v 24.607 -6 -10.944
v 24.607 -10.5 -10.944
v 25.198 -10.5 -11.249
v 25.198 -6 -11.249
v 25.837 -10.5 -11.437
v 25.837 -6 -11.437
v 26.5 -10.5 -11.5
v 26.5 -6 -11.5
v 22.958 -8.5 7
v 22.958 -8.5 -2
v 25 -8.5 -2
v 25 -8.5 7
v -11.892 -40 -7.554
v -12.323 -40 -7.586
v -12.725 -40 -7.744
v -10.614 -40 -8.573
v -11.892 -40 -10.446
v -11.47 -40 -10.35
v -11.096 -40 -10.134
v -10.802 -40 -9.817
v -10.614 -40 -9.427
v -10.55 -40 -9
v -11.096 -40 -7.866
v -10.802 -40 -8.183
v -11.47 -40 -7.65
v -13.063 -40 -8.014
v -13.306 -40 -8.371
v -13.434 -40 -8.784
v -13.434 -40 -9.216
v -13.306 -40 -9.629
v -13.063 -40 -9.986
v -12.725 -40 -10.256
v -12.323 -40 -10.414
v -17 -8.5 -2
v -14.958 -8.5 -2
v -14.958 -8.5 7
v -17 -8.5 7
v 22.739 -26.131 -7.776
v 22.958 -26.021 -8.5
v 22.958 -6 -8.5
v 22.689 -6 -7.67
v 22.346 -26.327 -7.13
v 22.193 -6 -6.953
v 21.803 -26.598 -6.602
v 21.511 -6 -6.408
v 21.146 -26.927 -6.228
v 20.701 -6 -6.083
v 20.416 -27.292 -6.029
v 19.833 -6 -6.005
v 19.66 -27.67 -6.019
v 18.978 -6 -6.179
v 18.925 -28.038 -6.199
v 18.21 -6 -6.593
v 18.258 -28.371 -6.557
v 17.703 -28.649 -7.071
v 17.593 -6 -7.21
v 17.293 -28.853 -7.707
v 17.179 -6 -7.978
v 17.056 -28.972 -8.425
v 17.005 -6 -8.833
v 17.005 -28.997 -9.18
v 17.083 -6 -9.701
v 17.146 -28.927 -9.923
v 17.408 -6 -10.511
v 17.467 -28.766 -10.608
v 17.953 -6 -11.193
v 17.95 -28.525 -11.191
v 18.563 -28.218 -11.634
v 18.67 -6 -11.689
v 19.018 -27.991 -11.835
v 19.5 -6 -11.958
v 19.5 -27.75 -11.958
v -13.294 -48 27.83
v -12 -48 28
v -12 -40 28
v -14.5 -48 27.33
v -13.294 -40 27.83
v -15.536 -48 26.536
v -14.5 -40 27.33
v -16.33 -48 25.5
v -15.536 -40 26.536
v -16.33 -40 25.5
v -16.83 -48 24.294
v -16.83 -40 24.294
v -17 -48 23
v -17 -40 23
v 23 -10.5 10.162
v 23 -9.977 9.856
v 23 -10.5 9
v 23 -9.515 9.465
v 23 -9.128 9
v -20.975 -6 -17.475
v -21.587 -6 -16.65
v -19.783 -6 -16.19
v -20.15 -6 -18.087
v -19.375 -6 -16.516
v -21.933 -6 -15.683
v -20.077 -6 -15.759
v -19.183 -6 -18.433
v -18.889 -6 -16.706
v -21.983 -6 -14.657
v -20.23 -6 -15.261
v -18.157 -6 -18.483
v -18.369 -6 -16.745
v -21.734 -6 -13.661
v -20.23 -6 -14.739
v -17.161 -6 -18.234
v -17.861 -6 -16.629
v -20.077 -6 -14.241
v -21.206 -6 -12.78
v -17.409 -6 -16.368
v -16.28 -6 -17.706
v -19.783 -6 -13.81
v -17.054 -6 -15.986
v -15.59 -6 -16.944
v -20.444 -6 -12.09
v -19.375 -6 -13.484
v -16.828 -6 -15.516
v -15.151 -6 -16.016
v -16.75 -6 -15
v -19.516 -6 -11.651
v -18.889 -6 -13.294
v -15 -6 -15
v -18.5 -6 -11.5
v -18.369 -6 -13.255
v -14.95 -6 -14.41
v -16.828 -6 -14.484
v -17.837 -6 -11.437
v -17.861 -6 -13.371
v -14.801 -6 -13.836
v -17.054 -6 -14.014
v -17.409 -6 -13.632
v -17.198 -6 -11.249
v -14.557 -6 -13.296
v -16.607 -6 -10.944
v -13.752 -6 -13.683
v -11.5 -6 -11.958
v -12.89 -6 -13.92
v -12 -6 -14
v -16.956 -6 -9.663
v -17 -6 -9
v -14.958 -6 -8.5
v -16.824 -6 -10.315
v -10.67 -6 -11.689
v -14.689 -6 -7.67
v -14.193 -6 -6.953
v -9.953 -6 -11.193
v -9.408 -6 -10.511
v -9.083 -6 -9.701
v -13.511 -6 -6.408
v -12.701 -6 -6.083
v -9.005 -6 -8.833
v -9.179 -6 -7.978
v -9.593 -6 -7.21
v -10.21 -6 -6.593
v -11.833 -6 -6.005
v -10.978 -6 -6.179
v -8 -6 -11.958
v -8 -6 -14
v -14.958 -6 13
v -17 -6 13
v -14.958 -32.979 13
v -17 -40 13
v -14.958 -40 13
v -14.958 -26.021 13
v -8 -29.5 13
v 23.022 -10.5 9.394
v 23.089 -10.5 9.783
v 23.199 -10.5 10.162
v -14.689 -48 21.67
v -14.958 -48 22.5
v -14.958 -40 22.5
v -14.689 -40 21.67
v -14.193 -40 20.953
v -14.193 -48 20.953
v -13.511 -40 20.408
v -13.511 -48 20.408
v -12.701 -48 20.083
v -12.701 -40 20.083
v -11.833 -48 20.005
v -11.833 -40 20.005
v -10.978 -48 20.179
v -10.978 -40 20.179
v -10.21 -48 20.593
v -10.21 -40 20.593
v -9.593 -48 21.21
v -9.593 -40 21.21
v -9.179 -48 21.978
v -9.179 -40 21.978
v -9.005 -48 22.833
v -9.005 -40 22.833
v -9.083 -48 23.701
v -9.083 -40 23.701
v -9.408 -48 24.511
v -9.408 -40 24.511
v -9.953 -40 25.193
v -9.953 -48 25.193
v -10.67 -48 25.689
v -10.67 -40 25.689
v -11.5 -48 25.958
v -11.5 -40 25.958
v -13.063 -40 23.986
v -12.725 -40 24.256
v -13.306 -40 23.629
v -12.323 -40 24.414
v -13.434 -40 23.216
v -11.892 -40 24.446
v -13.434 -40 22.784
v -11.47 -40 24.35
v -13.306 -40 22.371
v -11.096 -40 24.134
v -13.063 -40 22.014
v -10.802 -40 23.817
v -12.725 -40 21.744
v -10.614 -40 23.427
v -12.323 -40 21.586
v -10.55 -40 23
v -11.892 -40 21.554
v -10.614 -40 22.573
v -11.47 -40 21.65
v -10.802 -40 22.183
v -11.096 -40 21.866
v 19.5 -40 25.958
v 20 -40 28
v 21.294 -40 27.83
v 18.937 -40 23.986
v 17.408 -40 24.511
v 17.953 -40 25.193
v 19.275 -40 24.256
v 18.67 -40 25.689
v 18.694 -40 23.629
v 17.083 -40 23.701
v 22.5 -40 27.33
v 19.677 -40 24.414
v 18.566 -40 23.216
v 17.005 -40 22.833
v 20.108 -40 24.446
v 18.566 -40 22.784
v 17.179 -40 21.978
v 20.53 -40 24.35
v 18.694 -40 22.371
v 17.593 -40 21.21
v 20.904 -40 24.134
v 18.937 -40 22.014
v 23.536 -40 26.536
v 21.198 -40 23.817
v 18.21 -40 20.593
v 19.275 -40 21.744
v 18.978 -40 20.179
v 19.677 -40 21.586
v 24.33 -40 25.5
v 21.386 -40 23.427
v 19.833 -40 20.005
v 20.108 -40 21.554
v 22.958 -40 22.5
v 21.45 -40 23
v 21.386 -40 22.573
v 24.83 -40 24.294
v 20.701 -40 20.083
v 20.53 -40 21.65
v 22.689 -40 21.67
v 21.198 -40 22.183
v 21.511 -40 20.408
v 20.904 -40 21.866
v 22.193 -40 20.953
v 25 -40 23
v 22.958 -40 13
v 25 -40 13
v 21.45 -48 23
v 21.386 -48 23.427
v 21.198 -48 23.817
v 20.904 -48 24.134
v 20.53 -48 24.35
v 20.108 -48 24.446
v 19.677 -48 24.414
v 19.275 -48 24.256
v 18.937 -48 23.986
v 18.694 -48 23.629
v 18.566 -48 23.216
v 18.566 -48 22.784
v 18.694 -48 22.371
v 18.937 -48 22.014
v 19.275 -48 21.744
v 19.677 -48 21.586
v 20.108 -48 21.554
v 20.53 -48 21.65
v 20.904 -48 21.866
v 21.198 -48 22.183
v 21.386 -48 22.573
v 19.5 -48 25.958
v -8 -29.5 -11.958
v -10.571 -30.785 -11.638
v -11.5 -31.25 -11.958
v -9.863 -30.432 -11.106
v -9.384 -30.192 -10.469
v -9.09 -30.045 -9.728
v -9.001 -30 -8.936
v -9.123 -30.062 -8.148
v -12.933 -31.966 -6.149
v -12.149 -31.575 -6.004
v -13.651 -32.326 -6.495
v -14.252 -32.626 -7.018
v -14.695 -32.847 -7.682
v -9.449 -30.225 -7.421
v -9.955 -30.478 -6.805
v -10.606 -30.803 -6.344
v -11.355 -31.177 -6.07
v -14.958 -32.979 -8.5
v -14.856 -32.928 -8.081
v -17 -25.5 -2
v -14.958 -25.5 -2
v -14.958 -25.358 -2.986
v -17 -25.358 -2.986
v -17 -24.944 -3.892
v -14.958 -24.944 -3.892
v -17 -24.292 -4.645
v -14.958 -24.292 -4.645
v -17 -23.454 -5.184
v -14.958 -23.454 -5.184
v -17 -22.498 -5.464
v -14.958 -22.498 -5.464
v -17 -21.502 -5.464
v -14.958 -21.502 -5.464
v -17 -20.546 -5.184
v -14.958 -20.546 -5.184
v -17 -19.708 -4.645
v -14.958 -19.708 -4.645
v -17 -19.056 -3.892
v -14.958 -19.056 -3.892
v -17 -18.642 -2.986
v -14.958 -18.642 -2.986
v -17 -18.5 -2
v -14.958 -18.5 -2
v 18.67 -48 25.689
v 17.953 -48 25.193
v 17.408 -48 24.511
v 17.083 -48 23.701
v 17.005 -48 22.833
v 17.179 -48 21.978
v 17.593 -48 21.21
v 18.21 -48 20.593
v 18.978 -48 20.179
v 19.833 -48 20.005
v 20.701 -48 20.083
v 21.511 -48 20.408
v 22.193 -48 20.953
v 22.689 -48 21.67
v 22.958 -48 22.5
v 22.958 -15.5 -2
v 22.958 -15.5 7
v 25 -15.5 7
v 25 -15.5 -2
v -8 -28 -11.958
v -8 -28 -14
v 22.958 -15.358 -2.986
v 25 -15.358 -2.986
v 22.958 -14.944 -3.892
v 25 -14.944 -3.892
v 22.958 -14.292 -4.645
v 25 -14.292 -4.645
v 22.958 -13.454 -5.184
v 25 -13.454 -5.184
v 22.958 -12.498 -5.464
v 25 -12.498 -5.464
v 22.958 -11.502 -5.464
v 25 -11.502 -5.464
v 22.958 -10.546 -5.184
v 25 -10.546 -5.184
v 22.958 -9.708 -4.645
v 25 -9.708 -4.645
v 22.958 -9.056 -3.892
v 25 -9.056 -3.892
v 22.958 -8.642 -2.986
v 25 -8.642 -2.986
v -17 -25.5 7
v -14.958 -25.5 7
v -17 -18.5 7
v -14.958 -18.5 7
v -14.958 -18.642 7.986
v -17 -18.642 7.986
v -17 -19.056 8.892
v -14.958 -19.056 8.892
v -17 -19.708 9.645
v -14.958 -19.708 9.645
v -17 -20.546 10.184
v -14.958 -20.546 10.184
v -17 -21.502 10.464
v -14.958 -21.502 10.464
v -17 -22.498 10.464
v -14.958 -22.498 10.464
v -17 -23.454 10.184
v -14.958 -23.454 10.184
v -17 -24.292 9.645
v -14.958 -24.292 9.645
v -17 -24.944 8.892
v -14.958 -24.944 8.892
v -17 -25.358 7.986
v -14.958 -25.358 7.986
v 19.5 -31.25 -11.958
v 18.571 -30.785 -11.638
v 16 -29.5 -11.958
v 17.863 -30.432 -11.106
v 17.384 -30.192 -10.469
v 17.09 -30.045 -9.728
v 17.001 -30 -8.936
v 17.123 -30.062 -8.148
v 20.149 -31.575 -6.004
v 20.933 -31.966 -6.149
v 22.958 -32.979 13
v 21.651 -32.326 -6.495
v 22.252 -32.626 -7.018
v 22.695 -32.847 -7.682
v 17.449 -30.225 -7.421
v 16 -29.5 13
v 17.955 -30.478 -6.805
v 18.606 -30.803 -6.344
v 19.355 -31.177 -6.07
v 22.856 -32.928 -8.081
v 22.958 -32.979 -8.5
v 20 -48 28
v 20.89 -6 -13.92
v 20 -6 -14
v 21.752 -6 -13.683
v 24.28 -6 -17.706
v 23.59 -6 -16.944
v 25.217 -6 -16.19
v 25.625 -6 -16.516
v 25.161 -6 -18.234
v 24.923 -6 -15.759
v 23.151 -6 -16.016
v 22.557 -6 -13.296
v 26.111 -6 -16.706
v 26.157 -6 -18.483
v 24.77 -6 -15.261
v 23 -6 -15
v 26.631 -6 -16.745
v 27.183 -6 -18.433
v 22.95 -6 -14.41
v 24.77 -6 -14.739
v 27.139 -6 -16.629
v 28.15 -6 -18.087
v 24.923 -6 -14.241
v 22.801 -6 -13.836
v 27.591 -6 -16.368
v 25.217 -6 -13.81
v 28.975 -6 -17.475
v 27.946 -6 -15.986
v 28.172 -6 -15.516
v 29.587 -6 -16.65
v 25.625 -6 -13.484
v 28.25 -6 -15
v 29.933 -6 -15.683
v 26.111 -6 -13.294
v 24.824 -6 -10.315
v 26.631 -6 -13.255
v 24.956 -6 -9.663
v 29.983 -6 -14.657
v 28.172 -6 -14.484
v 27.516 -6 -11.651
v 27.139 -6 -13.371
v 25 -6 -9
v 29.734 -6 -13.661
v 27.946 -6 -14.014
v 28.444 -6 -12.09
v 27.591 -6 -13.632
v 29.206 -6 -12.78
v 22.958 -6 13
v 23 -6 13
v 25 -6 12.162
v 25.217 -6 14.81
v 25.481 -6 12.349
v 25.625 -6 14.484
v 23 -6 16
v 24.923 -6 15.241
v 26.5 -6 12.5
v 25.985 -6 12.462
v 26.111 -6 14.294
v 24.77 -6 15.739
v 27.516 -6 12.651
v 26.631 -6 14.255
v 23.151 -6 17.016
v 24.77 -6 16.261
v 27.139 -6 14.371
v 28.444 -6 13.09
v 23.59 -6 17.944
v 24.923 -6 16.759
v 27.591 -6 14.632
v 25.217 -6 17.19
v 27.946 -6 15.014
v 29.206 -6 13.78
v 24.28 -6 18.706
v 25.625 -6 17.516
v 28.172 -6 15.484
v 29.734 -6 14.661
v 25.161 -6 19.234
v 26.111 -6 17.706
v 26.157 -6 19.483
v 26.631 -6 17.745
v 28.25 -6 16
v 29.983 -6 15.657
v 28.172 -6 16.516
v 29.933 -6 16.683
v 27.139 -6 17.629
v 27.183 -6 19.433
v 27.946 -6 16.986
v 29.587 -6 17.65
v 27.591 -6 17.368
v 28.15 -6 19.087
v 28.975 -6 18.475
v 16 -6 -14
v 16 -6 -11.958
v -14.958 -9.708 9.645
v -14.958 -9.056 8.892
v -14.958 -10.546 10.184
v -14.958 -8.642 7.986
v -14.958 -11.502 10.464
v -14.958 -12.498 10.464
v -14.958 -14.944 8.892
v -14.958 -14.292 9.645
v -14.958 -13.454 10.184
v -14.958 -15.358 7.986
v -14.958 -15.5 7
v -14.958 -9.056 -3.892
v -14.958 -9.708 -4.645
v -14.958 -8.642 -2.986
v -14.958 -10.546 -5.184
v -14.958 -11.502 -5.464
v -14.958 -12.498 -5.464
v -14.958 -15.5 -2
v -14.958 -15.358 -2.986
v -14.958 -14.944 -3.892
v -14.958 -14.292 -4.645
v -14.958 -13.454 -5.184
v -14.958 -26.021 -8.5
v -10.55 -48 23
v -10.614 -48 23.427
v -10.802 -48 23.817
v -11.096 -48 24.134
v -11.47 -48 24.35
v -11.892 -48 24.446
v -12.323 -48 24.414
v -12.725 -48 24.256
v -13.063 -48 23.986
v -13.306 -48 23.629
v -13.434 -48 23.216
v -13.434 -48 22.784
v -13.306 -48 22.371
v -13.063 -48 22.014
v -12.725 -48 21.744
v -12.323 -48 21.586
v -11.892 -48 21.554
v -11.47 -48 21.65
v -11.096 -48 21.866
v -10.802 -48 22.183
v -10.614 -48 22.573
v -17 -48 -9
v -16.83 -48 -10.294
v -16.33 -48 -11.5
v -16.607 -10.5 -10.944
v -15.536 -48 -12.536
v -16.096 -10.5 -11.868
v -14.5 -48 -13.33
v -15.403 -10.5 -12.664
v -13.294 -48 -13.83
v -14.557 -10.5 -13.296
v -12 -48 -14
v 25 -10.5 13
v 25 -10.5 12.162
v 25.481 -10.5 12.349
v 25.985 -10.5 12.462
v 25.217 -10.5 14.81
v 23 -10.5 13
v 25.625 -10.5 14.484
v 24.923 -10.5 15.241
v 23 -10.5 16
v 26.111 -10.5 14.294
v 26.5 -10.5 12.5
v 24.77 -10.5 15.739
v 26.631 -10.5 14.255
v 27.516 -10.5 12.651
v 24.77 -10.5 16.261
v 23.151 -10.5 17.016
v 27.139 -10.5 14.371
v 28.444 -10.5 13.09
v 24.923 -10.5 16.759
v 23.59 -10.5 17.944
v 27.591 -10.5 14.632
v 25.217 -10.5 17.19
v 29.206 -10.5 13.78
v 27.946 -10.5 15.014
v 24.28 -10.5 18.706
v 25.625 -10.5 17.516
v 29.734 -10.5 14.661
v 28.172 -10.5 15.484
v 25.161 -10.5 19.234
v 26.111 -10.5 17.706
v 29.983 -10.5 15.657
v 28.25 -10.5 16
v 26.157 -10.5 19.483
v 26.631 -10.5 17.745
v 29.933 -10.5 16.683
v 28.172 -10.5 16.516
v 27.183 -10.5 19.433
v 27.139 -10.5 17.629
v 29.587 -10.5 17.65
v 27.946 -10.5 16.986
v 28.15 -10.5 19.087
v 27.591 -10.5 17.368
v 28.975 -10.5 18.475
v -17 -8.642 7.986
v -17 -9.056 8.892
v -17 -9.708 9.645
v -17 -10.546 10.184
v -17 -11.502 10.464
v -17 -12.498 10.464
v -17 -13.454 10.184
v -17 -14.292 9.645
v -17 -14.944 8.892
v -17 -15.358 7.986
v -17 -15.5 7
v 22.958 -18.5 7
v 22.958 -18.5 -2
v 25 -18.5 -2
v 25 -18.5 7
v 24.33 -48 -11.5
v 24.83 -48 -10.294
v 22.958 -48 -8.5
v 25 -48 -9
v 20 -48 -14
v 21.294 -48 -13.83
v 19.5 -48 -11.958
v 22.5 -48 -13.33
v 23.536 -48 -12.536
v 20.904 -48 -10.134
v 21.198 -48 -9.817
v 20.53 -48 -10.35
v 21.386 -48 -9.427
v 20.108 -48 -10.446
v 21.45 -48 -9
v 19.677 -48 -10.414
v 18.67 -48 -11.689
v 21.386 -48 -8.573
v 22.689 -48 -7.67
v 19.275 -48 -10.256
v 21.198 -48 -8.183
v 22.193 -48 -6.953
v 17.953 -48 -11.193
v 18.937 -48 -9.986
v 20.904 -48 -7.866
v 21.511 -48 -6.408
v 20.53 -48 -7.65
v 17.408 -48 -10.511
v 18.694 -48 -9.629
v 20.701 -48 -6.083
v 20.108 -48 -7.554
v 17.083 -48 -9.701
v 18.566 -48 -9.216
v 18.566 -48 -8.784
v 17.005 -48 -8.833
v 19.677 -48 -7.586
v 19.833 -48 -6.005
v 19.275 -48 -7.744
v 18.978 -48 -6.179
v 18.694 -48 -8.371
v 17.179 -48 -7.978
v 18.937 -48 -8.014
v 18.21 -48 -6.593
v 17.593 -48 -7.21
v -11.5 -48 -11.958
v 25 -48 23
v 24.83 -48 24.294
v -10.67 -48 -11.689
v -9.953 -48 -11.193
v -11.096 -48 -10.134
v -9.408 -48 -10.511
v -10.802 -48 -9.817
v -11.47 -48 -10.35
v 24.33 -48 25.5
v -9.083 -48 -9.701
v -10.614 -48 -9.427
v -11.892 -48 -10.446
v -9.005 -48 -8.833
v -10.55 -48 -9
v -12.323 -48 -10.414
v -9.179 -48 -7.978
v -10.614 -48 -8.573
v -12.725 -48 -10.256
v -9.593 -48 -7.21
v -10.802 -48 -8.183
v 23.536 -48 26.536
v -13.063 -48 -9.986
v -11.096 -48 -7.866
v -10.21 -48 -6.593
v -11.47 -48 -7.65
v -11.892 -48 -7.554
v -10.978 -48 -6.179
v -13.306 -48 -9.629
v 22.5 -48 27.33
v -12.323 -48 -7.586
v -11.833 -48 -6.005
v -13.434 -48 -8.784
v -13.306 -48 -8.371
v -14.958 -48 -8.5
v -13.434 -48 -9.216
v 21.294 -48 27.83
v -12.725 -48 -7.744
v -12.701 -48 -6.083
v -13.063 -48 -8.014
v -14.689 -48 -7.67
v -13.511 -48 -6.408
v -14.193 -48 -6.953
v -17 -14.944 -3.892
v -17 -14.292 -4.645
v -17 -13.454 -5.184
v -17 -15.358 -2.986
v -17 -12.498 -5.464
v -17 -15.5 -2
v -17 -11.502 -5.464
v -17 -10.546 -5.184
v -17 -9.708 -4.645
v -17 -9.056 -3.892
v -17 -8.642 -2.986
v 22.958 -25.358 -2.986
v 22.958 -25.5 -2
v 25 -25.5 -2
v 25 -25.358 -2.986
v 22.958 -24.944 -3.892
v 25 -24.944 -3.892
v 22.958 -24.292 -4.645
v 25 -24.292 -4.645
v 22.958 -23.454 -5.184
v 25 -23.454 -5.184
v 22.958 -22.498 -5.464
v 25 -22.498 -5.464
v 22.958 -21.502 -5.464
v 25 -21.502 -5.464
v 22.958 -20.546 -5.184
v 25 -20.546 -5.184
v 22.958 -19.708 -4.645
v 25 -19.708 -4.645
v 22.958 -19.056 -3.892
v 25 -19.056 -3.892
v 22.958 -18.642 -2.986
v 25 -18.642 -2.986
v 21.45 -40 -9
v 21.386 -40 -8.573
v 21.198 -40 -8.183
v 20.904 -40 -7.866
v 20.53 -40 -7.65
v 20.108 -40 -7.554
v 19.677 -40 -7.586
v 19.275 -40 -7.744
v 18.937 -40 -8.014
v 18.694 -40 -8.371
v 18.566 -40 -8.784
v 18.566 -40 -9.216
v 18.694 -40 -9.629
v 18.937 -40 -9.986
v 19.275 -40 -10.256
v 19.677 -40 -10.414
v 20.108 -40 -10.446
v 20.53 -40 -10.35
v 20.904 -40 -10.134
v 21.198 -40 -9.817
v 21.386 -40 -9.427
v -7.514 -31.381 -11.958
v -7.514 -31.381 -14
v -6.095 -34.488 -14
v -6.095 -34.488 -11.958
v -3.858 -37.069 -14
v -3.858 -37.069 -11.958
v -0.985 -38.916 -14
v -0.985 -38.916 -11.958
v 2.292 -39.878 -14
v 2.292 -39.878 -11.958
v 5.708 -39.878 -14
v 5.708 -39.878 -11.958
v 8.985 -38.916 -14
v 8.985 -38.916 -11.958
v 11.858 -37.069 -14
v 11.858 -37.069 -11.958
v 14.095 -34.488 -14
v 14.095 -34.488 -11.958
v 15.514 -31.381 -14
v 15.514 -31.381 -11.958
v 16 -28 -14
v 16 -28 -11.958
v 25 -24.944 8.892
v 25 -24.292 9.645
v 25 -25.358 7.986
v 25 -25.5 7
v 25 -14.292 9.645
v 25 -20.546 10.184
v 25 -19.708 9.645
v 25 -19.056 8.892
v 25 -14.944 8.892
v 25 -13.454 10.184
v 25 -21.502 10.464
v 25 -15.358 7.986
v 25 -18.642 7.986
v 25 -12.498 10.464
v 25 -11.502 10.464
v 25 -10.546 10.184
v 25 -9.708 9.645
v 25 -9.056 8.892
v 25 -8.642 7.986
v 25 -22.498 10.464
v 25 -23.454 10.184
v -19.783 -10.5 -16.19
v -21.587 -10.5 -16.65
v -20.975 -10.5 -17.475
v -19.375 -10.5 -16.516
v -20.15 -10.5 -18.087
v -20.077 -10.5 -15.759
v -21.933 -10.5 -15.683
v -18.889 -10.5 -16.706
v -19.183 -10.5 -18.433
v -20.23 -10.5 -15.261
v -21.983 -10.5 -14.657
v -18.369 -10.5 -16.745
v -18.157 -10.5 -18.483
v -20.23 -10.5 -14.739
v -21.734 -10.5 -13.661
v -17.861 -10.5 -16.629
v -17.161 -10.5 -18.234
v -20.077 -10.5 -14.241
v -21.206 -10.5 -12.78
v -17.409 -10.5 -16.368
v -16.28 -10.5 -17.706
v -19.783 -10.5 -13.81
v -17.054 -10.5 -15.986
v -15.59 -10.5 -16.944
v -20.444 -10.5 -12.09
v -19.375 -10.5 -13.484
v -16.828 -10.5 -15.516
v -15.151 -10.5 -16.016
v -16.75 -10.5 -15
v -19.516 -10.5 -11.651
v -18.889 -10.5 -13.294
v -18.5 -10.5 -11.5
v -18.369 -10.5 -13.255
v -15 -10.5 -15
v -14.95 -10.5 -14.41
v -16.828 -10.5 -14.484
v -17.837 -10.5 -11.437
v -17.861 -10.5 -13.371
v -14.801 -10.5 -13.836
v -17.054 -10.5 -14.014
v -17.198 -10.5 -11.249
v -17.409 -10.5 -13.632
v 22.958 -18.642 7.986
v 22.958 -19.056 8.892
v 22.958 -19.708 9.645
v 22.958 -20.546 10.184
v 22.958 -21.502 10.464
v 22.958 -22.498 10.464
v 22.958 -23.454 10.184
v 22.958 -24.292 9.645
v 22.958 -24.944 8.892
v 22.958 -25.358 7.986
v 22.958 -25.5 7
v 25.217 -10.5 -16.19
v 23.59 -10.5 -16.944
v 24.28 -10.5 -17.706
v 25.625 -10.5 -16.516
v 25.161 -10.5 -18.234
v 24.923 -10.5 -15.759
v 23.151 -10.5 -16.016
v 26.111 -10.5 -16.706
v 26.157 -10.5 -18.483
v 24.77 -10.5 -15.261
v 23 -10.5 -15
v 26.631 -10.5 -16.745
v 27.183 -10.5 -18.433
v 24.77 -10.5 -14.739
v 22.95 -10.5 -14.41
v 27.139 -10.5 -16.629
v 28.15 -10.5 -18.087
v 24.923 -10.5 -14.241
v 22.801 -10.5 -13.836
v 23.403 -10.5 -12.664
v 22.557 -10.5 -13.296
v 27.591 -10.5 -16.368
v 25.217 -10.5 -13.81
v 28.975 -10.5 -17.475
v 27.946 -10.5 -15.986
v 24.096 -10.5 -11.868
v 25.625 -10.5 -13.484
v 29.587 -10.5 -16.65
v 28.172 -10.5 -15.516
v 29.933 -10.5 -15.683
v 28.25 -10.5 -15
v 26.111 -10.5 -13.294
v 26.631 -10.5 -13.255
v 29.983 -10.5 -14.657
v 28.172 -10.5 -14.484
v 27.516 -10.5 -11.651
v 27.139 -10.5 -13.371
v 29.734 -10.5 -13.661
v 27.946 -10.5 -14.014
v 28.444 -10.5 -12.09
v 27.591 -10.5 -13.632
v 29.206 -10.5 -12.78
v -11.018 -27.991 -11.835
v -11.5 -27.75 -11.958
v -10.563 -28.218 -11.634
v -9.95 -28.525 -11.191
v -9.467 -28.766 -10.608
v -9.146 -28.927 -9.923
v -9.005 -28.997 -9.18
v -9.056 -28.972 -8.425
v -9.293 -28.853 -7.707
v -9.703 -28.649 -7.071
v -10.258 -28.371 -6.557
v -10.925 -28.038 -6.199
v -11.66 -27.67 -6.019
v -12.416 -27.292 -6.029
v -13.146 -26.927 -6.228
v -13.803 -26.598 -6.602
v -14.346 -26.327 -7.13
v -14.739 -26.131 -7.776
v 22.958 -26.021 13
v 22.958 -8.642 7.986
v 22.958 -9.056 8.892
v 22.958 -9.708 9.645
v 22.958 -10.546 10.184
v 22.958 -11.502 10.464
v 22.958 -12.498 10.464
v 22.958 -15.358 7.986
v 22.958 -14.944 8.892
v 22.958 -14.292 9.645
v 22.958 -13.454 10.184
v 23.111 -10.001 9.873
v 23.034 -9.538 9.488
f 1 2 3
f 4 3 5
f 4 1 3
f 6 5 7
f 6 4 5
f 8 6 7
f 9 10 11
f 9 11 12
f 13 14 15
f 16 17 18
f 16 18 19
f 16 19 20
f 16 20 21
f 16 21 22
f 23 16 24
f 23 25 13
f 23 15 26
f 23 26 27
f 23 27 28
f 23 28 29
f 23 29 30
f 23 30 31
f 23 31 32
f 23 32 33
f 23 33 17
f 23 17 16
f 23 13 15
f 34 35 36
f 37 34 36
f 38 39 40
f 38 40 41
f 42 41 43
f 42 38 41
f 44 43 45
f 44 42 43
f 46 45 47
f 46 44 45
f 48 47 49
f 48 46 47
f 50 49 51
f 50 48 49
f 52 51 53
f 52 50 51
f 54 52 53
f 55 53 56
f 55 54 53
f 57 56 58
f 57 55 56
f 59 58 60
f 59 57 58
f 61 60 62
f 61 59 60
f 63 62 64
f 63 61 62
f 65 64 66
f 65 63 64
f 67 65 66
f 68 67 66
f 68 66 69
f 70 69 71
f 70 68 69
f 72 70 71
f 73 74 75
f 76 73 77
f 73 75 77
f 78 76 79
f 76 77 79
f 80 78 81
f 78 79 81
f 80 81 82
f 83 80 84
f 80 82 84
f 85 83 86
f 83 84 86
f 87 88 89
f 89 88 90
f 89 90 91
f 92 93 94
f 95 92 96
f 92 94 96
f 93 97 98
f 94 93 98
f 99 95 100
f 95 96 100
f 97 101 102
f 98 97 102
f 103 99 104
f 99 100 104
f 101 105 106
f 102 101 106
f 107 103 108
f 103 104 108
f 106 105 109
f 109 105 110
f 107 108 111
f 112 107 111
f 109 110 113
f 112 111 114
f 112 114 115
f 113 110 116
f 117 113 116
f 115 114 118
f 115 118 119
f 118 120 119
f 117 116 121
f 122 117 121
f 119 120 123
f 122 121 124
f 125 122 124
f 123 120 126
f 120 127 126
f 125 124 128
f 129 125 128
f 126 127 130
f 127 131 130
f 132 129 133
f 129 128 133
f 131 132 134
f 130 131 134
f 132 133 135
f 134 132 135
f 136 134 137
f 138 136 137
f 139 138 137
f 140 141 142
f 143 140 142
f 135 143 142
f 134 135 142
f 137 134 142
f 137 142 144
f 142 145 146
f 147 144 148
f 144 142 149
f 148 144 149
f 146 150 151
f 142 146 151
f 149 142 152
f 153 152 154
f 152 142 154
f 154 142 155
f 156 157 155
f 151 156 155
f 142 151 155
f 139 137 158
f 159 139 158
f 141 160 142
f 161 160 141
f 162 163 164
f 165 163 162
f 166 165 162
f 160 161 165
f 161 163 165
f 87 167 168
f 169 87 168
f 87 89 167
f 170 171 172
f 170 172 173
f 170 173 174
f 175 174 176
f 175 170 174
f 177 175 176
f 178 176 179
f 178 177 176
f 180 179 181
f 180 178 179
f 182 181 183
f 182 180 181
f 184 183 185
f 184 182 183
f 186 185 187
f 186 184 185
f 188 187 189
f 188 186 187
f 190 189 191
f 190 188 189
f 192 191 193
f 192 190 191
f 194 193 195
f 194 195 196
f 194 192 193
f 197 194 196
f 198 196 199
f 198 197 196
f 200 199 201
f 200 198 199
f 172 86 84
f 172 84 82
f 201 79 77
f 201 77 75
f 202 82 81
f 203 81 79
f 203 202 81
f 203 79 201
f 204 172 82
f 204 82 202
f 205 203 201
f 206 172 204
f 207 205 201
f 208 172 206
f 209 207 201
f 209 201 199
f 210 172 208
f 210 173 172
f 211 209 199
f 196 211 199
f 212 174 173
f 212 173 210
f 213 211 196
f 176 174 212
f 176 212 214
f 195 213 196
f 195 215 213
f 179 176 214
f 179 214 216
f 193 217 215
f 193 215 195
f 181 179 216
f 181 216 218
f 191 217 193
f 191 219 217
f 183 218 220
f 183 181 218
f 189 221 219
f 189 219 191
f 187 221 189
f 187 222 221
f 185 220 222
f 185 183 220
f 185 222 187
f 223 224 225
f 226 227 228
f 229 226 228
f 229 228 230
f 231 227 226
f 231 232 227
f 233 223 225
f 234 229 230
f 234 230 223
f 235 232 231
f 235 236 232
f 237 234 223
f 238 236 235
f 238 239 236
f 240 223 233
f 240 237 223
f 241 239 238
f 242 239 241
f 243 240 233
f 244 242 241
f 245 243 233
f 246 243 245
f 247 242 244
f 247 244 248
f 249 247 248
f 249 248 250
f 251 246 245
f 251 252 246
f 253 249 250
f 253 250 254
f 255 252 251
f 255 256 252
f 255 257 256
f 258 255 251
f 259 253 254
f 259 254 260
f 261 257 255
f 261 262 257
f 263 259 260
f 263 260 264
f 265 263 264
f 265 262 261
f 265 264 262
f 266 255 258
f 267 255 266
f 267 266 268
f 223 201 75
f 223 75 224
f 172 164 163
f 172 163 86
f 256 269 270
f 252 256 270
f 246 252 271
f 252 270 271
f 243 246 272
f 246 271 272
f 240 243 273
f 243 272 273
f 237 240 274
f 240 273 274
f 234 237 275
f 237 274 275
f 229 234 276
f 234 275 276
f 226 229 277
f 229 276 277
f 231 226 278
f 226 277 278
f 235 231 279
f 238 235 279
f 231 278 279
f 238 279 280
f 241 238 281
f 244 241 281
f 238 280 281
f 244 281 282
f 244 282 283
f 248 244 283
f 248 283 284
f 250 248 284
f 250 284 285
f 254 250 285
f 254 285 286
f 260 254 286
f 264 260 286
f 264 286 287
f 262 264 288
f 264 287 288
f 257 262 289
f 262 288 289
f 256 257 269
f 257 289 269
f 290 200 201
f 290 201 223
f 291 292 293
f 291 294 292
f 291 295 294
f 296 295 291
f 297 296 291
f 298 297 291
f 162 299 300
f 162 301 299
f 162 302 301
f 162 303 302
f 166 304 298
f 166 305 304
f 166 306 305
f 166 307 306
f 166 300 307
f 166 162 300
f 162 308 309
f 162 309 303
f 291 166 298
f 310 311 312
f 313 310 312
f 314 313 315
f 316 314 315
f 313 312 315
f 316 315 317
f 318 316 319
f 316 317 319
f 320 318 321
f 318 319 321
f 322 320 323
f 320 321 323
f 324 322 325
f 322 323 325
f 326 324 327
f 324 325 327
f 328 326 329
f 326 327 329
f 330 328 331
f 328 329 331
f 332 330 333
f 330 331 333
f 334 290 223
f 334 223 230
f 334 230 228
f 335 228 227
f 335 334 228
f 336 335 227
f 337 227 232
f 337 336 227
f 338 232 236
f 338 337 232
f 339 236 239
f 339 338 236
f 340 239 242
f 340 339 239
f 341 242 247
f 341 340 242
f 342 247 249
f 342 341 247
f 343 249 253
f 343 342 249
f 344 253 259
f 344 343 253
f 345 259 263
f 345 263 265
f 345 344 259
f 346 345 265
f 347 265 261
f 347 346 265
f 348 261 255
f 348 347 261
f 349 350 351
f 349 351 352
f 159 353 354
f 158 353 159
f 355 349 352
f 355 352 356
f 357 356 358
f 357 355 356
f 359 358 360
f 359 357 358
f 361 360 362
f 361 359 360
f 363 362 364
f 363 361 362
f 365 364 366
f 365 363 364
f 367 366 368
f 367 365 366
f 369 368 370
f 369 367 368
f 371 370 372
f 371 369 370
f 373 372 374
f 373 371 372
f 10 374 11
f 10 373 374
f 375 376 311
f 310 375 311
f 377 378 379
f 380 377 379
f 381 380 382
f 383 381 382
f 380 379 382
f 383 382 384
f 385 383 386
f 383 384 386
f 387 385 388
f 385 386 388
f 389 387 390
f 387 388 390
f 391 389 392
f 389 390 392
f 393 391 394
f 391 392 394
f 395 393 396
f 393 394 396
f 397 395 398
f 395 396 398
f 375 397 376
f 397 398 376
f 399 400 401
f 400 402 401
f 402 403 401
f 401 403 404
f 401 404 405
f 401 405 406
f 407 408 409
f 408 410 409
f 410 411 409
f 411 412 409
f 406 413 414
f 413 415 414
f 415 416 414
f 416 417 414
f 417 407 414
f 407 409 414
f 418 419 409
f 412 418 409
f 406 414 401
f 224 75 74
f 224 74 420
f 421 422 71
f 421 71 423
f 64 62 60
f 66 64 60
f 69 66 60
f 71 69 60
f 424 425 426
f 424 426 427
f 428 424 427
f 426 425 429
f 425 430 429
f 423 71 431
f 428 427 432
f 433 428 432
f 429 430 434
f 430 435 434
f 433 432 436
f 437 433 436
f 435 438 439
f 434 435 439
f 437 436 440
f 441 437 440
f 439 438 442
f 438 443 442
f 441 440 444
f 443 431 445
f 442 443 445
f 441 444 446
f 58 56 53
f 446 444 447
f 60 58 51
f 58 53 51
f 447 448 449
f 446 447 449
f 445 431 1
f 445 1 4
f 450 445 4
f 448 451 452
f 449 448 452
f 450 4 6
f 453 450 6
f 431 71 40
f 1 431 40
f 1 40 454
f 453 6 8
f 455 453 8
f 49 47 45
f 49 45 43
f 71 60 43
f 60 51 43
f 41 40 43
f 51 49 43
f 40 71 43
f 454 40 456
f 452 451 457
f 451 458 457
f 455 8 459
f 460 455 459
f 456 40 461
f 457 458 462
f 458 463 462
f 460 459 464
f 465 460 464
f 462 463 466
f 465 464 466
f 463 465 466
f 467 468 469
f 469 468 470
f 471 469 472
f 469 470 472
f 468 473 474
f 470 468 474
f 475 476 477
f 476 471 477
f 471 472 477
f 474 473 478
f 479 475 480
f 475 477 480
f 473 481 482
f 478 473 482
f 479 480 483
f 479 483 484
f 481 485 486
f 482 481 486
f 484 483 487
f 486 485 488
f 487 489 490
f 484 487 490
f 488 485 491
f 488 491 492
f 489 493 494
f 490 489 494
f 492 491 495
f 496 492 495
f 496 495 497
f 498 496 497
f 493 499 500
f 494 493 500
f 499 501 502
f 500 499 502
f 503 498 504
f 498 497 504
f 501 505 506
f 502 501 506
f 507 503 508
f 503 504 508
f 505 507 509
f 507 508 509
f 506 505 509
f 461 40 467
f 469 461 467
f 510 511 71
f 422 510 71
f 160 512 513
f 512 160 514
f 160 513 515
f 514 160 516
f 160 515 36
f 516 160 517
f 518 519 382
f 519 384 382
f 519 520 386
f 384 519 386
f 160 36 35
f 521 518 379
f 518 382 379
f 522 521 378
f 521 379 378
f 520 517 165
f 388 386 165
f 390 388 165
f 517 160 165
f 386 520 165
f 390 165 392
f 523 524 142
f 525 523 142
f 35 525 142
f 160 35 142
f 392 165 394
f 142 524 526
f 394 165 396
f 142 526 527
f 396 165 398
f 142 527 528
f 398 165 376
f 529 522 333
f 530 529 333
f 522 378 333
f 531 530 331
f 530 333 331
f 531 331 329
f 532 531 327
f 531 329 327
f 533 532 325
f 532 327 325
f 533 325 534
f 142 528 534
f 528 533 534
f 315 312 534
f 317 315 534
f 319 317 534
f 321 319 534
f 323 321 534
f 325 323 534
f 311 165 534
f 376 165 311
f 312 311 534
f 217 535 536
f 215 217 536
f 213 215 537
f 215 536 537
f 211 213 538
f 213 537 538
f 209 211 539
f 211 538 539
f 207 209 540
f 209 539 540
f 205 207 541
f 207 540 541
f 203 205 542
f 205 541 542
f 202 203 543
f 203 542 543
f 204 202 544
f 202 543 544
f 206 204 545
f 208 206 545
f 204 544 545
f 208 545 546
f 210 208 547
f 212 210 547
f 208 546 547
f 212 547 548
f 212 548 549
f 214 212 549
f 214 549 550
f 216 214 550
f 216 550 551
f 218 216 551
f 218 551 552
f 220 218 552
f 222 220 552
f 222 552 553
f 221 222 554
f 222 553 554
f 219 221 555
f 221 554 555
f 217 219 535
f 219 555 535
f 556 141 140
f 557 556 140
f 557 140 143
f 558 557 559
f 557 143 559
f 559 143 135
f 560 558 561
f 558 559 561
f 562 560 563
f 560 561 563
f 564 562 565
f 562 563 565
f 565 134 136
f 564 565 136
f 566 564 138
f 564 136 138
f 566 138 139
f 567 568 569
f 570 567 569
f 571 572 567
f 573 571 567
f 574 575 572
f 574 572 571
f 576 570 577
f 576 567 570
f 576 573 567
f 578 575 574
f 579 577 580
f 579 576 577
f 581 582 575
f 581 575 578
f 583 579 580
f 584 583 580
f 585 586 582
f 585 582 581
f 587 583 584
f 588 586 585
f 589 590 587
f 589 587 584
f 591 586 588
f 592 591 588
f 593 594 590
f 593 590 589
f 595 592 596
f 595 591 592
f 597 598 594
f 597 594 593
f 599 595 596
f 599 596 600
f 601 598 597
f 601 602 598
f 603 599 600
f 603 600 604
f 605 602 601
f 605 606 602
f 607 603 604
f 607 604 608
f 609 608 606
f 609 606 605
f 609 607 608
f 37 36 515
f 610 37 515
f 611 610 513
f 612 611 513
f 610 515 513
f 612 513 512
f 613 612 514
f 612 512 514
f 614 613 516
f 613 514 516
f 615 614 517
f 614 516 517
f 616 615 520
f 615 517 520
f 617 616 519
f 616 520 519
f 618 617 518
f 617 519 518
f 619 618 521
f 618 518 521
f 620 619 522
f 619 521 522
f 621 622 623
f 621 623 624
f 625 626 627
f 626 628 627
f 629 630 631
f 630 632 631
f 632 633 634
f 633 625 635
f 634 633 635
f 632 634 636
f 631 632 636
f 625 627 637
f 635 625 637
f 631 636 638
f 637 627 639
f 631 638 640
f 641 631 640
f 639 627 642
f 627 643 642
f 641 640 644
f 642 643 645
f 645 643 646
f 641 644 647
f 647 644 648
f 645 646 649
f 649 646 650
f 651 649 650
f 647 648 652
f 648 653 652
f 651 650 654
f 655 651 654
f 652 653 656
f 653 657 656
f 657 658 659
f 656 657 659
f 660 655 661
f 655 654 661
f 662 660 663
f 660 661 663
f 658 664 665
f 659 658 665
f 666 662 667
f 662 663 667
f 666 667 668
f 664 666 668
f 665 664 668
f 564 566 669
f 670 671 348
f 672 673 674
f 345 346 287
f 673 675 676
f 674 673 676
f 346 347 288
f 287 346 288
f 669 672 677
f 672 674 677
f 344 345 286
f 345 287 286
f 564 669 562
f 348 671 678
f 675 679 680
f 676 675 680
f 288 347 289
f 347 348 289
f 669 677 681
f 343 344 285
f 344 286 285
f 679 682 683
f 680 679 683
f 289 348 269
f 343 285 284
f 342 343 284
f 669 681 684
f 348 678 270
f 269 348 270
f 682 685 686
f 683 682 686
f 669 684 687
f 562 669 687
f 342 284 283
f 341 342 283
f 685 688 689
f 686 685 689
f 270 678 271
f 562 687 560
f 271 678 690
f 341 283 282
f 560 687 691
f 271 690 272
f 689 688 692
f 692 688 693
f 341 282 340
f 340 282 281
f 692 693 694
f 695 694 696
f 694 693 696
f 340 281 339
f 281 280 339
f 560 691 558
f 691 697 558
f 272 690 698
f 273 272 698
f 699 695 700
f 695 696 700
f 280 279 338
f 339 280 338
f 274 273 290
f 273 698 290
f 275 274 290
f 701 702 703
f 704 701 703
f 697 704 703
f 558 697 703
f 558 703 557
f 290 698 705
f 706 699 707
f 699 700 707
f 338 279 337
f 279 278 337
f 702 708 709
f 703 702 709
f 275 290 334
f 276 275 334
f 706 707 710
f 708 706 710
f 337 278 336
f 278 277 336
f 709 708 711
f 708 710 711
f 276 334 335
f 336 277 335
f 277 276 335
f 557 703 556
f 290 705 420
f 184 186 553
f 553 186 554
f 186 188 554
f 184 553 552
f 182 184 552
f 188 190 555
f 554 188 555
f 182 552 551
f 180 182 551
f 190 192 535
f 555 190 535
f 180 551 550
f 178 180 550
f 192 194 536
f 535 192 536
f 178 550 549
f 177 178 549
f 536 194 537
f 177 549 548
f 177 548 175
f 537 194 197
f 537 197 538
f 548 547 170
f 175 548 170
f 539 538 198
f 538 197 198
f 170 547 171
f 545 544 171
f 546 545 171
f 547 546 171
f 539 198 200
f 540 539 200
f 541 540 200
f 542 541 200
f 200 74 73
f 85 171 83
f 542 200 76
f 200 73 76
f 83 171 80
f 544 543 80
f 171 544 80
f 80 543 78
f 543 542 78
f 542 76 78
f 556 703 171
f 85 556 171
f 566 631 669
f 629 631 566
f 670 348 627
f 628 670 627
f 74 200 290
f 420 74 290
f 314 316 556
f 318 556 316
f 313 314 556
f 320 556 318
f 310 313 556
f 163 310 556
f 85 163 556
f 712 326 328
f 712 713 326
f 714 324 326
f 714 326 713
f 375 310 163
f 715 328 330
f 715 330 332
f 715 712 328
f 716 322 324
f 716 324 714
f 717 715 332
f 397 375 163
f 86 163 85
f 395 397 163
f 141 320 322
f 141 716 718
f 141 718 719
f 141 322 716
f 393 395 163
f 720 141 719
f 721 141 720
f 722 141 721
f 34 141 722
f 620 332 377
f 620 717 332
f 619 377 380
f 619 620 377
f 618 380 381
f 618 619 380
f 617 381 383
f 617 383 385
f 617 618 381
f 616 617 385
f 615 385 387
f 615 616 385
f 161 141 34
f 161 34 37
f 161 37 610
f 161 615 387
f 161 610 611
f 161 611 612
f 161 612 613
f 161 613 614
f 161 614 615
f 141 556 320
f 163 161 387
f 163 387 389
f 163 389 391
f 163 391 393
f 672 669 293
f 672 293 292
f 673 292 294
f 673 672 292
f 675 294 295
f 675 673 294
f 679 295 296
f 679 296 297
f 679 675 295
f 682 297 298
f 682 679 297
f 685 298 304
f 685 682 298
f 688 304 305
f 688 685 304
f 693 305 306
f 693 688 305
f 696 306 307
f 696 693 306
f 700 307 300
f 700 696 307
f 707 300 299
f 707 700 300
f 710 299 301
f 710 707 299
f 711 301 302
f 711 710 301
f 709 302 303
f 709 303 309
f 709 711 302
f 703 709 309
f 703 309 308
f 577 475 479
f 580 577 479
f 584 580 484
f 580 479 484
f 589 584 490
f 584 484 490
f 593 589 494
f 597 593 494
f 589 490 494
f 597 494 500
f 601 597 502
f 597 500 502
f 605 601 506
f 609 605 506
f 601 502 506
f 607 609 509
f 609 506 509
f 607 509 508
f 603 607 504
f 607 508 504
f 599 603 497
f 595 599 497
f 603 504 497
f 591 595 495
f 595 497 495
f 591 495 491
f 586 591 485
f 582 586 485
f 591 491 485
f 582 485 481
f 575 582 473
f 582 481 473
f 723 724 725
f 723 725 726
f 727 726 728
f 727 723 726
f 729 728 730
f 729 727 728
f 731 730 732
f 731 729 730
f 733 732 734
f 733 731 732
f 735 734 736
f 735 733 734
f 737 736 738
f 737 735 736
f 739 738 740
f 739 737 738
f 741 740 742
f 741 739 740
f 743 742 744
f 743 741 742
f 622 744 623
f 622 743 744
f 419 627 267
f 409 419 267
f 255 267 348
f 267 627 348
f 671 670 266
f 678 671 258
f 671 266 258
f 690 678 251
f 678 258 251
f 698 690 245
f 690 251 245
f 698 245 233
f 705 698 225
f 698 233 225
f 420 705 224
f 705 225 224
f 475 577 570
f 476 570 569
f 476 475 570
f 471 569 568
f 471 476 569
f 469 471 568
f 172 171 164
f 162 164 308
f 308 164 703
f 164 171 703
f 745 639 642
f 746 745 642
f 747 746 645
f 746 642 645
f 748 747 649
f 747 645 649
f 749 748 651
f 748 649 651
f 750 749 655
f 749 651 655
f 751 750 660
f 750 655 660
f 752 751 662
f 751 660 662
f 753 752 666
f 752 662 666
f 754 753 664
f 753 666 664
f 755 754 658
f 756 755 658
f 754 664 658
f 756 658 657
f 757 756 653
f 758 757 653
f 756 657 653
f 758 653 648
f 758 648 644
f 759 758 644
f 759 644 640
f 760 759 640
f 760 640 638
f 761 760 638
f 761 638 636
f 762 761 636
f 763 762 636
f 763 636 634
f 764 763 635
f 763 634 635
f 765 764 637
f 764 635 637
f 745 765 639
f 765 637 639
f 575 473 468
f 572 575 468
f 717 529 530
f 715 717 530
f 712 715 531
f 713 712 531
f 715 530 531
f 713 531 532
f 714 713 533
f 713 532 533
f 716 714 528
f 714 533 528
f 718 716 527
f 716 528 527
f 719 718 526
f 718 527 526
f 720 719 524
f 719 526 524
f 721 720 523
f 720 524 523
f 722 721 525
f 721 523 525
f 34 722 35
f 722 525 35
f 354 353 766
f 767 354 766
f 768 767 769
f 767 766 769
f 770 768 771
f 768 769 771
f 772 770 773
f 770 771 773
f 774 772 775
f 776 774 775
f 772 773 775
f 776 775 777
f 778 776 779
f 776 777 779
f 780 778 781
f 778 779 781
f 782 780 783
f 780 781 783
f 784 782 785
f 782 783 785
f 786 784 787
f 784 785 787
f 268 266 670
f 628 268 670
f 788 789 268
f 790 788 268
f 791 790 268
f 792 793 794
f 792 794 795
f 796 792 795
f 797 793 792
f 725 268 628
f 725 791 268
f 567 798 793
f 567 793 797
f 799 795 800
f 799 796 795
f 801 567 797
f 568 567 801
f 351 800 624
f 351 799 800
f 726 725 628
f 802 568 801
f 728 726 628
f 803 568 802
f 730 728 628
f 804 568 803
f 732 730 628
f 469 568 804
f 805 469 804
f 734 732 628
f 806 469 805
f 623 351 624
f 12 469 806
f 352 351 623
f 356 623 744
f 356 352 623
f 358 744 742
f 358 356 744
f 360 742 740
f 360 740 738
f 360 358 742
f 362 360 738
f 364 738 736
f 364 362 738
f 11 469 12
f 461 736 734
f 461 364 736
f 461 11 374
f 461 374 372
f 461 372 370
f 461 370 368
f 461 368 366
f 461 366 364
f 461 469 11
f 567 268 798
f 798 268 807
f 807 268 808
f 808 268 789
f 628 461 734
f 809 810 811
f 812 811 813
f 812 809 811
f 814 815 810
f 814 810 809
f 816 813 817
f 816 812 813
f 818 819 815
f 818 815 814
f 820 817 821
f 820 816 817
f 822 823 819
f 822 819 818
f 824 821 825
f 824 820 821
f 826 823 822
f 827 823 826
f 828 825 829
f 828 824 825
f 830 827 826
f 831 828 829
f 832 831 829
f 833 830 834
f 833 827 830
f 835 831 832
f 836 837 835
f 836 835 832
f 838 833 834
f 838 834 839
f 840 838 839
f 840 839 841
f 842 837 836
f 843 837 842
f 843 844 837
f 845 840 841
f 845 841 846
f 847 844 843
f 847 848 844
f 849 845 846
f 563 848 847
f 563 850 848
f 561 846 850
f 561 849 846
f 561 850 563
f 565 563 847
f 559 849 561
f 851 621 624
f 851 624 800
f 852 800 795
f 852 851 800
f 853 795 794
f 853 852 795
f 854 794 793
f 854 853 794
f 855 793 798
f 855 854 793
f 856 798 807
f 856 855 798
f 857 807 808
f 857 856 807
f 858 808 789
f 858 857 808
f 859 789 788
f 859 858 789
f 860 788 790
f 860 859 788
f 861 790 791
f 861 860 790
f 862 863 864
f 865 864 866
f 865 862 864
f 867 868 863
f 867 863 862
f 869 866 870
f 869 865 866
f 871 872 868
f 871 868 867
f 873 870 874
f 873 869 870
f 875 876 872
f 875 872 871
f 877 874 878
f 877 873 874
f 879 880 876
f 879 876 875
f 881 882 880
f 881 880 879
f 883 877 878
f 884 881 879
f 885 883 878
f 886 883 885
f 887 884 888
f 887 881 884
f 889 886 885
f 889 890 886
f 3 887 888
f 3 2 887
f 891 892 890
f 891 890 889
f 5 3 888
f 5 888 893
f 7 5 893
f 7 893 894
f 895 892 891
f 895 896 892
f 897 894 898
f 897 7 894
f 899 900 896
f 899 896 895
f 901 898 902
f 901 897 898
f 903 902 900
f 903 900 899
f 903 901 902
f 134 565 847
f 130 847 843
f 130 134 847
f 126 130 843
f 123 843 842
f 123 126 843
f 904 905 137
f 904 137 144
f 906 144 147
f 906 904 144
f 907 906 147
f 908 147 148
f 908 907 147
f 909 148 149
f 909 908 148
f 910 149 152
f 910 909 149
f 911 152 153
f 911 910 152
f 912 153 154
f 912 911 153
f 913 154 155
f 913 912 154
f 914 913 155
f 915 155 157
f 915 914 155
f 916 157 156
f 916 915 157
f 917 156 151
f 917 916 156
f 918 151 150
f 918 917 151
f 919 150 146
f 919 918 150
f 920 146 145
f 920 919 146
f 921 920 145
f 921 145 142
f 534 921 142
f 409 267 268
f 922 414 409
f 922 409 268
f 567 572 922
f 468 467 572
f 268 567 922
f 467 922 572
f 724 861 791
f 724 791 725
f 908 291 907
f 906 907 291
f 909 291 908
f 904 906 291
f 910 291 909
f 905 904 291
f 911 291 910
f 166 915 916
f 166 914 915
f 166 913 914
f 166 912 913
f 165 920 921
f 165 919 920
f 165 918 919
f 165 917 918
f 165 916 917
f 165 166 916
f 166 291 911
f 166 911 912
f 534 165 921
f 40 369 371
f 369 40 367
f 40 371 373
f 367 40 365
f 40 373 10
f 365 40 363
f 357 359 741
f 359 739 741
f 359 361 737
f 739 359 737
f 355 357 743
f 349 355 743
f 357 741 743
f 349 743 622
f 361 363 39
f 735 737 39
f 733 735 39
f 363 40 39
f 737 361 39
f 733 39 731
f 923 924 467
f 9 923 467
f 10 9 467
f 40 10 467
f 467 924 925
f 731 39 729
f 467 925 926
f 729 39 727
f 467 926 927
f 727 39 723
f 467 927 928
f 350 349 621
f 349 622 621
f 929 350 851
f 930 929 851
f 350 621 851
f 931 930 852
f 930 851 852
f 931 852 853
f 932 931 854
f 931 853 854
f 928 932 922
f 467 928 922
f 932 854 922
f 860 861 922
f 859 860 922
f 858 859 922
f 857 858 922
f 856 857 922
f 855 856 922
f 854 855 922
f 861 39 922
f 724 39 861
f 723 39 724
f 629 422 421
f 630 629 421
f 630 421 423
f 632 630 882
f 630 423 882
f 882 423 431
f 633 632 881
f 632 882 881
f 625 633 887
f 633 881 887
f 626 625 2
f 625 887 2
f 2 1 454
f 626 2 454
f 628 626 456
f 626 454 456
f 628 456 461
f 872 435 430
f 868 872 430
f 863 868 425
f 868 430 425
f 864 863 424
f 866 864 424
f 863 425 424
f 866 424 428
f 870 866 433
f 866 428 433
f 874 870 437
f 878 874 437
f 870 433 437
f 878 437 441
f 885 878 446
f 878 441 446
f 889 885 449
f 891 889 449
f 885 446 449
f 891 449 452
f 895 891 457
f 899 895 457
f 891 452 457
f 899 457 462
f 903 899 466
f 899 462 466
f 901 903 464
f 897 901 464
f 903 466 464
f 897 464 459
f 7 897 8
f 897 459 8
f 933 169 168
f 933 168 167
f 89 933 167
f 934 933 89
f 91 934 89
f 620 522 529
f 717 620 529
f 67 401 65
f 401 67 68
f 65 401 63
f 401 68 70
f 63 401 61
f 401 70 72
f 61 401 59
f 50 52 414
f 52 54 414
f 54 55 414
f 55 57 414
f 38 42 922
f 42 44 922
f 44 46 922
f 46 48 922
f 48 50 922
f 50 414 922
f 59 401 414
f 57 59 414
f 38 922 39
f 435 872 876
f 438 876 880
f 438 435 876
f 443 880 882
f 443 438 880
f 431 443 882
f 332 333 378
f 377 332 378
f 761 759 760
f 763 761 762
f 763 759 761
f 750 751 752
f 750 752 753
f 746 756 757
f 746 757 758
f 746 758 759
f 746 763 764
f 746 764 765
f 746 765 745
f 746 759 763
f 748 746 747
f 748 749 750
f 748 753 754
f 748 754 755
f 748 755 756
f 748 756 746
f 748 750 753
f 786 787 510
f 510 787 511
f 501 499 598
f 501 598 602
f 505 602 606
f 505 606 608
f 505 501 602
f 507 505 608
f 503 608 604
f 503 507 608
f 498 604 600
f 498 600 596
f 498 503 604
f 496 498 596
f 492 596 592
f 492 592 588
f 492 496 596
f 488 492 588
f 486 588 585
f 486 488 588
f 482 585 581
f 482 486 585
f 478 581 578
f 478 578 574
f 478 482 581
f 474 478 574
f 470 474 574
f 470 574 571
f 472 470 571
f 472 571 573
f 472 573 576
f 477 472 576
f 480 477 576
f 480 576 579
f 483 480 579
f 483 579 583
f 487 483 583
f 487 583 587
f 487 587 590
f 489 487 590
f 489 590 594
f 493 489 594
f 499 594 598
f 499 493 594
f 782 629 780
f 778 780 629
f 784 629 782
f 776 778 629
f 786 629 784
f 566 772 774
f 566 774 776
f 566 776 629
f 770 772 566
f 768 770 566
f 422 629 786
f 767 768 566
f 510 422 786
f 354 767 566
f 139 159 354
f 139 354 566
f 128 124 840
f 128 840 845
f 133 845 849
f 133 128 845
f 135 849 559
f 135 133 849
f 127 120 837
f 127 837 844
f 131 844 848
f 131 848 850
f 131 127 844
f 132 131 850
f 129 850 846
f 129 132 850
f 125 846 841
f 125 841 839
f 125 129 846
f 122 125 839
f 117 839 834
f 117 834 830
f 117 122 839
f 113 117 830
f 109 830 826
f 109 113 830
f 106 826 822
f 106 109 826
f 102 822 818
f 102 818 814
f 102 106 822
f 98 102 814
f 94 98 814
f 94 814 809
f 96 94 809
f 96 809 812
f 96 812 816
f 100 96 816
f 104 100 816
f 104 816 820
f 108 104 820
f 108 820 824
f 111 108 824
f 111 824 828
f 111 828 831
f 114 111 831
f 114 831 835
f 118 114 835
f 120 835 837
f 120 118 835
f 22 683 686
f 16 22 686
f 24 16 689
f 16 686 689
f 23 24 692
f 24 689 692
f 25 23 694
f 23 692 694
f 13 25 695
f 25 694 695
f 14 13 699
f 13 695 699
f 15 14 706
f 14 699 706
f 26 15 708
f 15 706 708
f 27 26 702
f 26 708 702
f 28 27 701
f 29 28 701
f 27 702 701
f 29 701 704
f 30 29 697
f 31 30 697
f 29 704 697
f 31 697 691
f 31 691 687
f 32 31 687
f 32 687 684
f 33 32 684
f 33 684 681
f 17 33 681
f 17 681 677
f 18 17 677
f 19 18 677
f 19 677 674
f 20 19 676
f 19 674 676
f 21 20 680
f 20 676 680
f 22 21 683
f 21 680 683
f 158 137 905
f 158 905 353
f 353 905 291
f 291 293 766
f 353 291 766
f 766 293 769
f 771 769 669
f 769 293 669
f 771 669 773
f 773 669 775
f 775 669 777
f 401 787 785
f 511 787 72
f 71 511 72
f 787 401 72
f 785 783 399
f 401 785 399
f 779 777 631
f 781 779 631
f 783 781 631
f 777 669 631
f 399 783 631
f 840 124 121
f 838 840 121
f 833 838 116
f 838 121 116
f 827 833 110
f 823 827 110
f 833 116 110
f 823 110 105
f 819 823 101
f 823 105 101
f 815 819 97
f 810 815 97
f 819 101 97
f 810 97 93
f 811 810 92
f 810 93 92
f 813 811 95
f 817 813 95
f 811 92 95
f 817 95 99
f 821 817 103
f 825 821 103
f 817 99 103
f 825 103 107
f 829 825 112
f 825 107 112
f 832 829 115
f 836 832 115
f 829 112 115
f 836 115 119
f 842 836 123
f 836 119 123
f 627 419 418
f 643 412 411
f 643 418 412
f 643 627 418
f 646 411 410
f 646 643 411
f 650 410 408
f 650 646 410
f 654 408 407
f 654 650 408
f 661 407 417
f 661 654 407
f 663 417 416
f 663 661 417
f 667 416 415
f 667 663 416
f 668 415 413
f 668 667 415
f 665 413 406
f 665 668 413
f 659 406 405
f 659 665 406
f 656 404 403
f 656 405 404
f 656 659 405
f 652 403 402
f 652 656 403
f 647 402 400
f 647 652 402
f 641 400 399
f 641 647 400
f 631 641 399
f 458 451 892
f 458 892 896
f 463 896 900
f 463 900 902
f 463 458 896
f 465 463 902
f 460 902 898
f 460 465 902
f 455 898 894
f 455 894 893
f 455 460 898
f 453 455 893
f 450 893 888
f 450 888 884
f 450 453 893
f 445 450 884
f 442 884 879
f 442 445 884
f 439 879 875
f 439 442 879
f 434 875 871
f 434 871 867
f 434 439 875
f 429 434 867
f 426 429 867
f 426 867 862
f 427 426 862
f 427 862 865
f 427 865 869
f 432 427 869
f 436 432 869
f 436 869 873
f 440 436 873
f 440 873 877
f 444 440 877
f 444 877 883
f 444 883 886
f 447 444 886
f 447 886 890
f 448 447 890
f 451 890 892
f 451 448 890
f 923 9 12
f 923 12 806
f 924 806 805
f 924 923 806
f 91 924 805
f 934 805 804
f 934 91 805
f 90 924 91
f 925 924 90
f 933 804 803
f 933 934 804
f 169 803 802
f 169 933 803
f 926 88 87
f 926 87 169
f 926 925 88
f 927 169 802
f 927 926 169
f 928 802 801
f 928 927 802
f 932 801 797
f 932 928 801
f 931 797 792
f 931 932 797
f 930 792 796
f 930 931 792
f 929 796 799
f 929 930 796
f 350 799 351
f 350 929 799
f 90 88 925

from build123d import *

# Parameters (mm, degrees)
PAD003_DEPTH         = 42
SKETCH008_W          = 60
SKETCH008_H          = 34
POCKET004_DEPTH      = 15.001
SKETCH009_R          = 1.45
POCKET005_DEPTH      = 8
POCKET006_DEPTH      = 42.001
POCKET008_DEPTH      = 21.001
POCKET008_DEPTH_BACK = 21.001
SKETCH013_R          = 1.75
PAD004_DEPTH         = 4.5
POCKET_DEPTH         = 25.501
PAD015_DEPTH         = 25


with BuildPart() as part:
    # Sketch006 → Pad003 (new body)
    with BuildSketch(Plane.XZ):
        with BuildLine():
            Line((-16, 21), (16, 21))
            ThreePointArc((21, 16), (19.5355339059, 19.5355339059), (16, 21))
            Line((21, 16), (21, -16))
            ThreePointArc((16, -21), (19.5355339059, -19.5355339059), (21, -16))
            Line((16, -21), (-16, -21))
            ThreePointArc((-21, -16), (-19.5355339059, -19.5355339059), (-16, -21))
            Line((-21, -16), (-21, 16))
            ThreePointArc((-16, 21), (-19.5355339059, 19.5355339059), (-21, 16))
        make_face()
    extrude(amount=PAD003_DEPTH)

    # Sketch008 (on DatumPlane) → Pocket004 (cut, through all)
    with BuildSketch(Plane.XY.offset(6)):
        with Locations((0, -17)):
            Rectangle(SKETCH008_W, SKETCH008_H)
    extrude(amount=POCKET004_DEPTH, mode=Mode.SUBTRACT)

    # Sketch009 (on DatumPlane) → Pocket005 (cut)
    with BuildSketch(Plane.XZ.offset(42)):
        with Locations((-16, 16)):
            Circle(SKETCH009_R)
        with Locations((16, 16)):
            Circle(SKETCH009_R)
        with Locations((-16, -16)):
            Circle(SKETCH009_R)
        with Locations((16, -16)):
            Circle(SKETCH009_R)
    extrude(amount=-POCKET005_DEPTH, mode=Mode.SUBTRACT)

    # Sketch010 (on DatumPlane) → Pocket006 (cut, through all)
    with BuildSketch(Plane.XZ.offset(42)):
        with BuildLine():
            Line((-18.9580398915, 15.5), (-18.9580398915, -15.5))
            ThreePointArc((-15.5, -18.9580398915), (-13.8786796564, -13.8786796564), (-18.9580398915, -15.5))
            Line((-15.5, -18.9580398915), (15.5, -18.9580398915))
            ThreePointArc((18.9580398915, -15.5), (13.8786796564, -13.8786796564), (15.5, -18.9580398915))
            Line((18.9580398915, -15.5), (18.9580398915, 15.5))
            ThreePointArc((15.5, 18.9580398915), (13.8786796564, 13.8786796564), (18.9580398915, 15.5))
            Line((-15.5, 18.9580398915), (15.5, 18.9580398915))
            ThreePointArc((-18.9580398915, 15.5), (-13.8786796564, 13.8786796564), (-15.5, 18.9580398915))
        make_face()
    extrude(amount=-POCKET006_DEPTH, mode=Mode.SUBTRACT)

    # Sketch012 → Pocket008 (cut, two sides)
    with BuildSketch(Plane.YZ) as pocket008_sk:
        with BuildLine():
            ThreePointArc((-2.5, 0), (-6, 3.5), (-9.5, 0))
            Line((-9.5, 0), (-9.5, -9))
            ThreePointArc((-9.5, -9), (-6, -12.5), (-2.5, -9))
            Line((-2.5, -9), (-2.5, 0))
        make_face()
        with BuildLine():
            ThreePointArc((-12.5, 0), (-16, 3.5), (-19.5, 0))
            Line((-19.5, 0), (-19.5, -9))
            ThreePointArc((-19.5, -9), (-16, -12.5), (-12.5, -9))
            Line((-12.5, -9), (-12.5, 0))
        make_face()
    extrude(amount=-POCKET008_DEPTH, mode=Mode.SUBTRACT)
    extrude(pocket008_sk.sketch, amount=POCKET008_DEPTH_BACK, mode=Mode.SUBTRACT)

    # Sketch013 → Pad004 (join)
    with BuildSketch(Plane.XZ):
        with BuildLine():
            ThreePointArc((22.5, 5.5), (24.9748737342, 11.4748737342), (19, 9))
            Line((19.0000000001, 9), (19.0000000001, 2.0000200959))
            ThreePointArc((22.5, 5.5), (20.0251333708, 4.4748808391), (19.0000000001, 2.0000200959))
        make_face()
        with Locations((22.5, 9)):
            Circle(SKETCH013_R, mode=Mode.SUBTRACT)
        with BuildLine():
            ThreePointArc((-22.5, -18.5), (-24.9748737342, -24.4748737342), (-19, -22))
            ThreePointArc((-18.0892857143, -19.6450903436), (-18.7643912143, -20.7375618827), (-19, -22))
            Line((-20.1450903436, -17.5892857143), (-18.0892857143, -19.6450903436))
            ThreePointArc((-22.5, -18.5), (-21.2375618827, -18.2643912143), (-20.1450903436, -17.5892857143))
        make_face()
        with Locations((-22.5, -22)):
            Circle(SKETCH013_R, mode=Mode.SUBTRACT)
        with BuildLine():
            ThreePointArc((19, -22), (24.9748737342, -24.4748737342), (22.5, -18.5))
            ThreePointArc((20.1450903436, -17.5892857143), (21.2375618827, -18.2643912143), (22.5, -18.5))
            Line((18.0892857143, -19.6450903436), (20.1450903436, -17.5892857143))
            ThreePointArc((19, -22), (18.7643912143, -20.7375618827), (18.0892857143, -19.6450903436))
        make_face()
        with Locations((22.5, -22)):
            Circle(SKETCH013_R, mode=Mode.SUBTRACT)
    extrude(amount=PAD004_DEPTH)

    # Sketch015 → Pocket (cut, through all)
    with BuildSketch(Plane.XY):
        with BuildLine():
            ThreePointArc((-12, -22), (0, -34), (12, -22))
            Line((12, -22), (12, 0))
            Line((-12, 0), (12, 0))
            Line((-12, -22), (-12, 0))
        make_face()
    extrude(amount=-POCKET_DEPTH, mode=Mode.SUBTRACT)

    # Sketch040 (on DatumPlane) → Pad015 (join)
    with BuildSketch(Plane.XY.offset(6)):
        Polygon((-19, -20), (-19, -27), (-12, -23.5), align=None)
        Polygon((19, -20), (19, -27), (12, -23.5), align=None)
    extrude(amount=-PAD015_DEPTH)


with BuildPart() as part_1:
    # Body placement: moved
    add(part.part.moved(Location((4, -6, 7))))


solid = part_1.part
